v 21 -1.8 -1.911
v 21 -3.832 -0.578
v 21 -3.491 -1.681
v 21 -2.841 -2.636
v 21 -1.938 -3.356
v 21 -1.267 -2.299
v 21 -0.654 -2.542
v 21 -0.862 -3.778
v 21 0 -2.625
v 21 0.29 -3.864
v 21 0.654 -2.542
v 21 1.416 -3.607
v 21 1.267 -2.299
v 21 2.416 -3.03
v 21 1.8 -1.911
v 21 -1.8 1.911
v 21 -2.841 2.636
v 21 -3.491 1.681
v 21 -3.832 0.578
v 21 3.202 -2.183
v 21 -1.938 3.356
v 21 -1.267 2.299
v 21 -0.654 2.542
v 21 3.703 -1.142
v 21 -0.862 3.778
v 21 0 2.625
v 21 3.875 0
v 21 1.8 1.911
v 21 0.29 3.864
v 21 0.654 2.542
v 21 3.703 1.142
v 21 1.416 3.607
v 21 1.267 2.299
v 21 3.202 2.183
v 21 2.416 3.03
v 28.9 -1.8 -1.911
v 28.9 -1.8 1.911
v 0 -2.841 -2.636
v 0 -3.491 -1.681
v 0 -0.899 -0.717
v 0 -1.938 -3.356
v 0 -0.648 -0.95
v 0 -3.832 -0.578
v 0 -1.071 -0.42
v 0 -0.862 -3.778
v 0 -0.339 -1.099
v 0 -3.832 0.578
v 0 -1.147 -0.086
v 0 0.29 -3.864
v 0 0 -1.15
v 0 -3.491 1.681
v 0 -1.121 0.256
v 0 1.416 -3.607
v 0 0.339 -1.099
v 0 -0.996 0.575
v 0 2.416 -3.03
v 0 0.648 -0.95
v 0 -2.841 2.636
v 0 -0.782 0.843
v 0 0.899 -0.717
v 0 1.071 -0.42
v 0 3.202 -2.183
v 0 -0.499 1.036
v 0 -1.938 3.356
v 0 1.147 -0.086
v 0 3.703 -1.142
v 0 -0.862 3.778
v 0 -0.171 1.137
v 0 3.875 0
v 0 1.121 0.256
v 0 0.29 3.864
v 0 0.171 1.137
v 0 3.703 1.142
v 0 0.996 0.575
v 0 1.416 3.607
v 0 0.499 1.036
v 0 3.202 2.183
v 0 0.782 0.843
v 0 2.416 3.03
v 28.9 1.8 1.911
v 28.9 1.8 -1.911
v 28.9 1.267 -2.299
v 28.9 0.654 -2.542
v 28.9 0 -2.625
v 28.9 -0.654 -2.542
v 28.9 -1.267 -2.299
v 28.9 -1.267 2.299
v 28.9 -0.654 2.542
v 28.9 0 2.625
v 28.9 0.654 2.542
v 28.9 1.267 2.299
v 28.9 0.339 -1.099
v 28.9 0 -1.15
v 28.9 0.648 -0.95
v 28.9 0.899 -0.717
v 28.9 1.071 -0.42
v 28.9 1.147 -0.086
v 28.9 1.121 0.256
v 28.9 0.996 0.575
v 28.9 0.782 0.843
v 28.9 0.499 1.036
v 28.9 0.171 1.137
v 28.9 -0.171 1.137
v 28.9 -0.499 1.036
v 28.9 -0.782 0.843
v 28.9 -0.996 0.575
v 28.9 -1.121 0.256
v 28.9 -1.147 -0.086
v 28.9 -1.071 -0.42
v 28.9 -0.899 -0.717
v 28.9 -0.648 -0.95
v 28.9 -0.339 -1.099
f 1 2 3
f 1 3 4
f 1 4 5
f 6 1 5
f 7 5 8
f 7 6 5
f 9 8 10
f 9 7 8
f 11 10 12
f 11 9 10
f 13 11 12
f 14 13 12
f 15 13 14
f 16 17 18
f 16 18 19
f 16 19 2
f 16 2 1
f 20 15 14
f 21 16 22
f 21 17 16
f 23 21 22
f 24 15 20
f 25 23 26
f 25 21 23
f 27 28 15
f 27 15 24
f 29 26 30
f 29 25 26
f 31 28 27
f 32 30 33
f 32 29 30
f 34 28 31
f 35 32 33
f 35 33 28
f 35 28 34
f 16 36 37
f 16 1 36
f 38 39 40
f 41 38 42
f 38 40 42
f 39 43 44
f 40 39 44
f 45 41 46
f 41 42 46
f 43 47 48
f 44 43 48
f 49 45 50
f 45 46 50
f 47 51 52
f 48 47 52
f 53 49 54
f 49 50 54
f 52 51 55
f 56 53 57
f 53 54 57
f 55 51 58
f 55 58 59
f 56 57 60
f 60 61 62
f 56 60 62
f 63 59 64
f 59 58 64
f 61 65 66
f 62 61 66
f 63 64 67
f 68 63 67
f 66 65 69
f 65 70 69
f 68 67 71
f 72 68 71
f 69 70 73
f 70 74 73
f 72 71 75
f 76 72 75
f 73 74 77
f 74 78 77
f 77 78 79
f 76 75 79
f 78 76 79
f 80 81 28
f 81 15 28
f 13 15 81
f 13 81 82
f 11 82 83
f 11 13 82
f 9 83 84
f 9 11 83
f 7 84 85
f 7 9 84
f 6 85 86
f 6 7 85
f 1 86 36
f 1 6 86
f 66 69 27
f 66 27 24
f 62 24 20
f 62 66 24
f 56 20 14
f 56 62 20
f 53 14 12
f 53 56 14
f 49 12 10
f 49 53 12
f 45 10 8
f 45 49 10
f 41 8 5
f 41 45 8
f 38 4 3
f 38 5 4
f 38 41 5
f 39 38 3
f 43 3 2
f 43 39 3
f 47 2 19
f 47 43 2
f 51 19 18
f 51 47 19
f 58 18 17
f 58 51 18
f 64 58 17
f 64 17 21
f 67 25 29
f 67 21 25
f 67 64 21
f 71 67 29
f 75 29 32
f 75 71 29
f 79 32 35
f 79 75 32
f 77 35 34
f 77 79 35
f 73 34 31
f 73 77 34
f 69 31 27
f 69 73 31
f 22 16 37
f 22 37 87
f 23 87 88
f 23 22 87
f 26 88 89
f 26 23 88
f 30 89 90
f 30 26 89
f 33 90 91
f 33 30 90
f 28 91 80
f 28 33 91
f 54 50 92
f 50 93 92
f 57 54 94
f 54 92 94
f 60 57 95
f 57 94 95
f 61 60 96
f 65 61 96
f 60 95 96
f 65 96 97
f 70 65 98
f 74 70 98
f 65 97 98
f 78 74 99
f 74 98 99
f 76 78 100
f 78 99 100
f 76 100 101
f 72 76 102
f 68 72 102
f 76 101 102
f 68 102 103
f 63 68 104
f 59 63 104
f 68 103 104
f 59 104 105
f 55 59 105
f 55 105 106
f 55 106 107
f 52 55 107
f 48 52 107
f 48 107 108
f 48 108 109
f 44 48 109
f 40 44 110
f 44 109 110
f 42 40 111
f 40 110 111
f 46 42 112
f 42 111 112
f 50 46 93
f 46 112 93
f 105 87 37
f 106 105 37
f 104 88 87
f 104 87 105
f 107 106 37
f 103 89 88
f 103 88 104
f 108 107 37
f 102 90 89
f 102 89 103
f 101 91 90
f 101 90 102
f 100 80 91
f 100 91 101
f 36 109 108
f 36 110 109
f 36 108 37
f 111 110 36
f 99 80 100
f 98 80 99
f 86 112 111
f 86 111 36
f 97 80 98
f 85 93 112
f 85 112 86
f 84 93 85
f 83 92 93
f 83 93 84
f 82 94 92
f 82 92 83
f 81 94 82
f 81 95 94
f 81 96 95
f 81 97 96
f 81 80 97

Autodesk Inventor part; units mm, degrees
ref_plane "YZ Plane" through (0, 0, 0) normal (1, 0, 0) x (0, 1, 0)
ref_plane "XZ Plane" through (0, 0, 0) normal (0, 1, 0) x (-1, 0, 0)
ref_plane "XY Plane" through (0, 0, 0) normal (0, 0, 1) x (1, 0, 0)
sketch "Sketch1" plane through (0, 0, 0) normal (1, 0, 0) x (0, 1, 0)
  circle A0 centre (0, 0) radius 3.875
  dimension "d0" = 7.75
extrude "Extrusion1" add sketch "Sketch1" along normal blind 21
sketch "Sketch2" plane through (21, 0, 0) normal (1, 0, 0) x (0, 0, -1)
  circle A0 centre (0, 0) radius 2.625
  line L0 (1.9107, -1.8) -> (-1.9107, -1.8)
  line L1 (-2.625, 0) -> (2.625, 0)
  line L2 (1.9107, 1.8) -> (-1.9107, 1.8)
  dimension "d3" = 5.25
  dimension "d4" = 1.8
extrude "Extrusion2" add sketch "Sketch2" along normal blind 7.9 contours L1 A0 L2 | A0 L0 L1
sketch "Sketch3" plane through (28.9, 0, 0) normal (1, 0, 0) x (0, 0, -1)
  circle A0 centre (0, 0) radius 1.15
  dimension "d7" = 2.3
extrude "Extrusion3" cut sketch "Sketch3" against normal through all
properties part number "shaft shooting_3DPrint"
